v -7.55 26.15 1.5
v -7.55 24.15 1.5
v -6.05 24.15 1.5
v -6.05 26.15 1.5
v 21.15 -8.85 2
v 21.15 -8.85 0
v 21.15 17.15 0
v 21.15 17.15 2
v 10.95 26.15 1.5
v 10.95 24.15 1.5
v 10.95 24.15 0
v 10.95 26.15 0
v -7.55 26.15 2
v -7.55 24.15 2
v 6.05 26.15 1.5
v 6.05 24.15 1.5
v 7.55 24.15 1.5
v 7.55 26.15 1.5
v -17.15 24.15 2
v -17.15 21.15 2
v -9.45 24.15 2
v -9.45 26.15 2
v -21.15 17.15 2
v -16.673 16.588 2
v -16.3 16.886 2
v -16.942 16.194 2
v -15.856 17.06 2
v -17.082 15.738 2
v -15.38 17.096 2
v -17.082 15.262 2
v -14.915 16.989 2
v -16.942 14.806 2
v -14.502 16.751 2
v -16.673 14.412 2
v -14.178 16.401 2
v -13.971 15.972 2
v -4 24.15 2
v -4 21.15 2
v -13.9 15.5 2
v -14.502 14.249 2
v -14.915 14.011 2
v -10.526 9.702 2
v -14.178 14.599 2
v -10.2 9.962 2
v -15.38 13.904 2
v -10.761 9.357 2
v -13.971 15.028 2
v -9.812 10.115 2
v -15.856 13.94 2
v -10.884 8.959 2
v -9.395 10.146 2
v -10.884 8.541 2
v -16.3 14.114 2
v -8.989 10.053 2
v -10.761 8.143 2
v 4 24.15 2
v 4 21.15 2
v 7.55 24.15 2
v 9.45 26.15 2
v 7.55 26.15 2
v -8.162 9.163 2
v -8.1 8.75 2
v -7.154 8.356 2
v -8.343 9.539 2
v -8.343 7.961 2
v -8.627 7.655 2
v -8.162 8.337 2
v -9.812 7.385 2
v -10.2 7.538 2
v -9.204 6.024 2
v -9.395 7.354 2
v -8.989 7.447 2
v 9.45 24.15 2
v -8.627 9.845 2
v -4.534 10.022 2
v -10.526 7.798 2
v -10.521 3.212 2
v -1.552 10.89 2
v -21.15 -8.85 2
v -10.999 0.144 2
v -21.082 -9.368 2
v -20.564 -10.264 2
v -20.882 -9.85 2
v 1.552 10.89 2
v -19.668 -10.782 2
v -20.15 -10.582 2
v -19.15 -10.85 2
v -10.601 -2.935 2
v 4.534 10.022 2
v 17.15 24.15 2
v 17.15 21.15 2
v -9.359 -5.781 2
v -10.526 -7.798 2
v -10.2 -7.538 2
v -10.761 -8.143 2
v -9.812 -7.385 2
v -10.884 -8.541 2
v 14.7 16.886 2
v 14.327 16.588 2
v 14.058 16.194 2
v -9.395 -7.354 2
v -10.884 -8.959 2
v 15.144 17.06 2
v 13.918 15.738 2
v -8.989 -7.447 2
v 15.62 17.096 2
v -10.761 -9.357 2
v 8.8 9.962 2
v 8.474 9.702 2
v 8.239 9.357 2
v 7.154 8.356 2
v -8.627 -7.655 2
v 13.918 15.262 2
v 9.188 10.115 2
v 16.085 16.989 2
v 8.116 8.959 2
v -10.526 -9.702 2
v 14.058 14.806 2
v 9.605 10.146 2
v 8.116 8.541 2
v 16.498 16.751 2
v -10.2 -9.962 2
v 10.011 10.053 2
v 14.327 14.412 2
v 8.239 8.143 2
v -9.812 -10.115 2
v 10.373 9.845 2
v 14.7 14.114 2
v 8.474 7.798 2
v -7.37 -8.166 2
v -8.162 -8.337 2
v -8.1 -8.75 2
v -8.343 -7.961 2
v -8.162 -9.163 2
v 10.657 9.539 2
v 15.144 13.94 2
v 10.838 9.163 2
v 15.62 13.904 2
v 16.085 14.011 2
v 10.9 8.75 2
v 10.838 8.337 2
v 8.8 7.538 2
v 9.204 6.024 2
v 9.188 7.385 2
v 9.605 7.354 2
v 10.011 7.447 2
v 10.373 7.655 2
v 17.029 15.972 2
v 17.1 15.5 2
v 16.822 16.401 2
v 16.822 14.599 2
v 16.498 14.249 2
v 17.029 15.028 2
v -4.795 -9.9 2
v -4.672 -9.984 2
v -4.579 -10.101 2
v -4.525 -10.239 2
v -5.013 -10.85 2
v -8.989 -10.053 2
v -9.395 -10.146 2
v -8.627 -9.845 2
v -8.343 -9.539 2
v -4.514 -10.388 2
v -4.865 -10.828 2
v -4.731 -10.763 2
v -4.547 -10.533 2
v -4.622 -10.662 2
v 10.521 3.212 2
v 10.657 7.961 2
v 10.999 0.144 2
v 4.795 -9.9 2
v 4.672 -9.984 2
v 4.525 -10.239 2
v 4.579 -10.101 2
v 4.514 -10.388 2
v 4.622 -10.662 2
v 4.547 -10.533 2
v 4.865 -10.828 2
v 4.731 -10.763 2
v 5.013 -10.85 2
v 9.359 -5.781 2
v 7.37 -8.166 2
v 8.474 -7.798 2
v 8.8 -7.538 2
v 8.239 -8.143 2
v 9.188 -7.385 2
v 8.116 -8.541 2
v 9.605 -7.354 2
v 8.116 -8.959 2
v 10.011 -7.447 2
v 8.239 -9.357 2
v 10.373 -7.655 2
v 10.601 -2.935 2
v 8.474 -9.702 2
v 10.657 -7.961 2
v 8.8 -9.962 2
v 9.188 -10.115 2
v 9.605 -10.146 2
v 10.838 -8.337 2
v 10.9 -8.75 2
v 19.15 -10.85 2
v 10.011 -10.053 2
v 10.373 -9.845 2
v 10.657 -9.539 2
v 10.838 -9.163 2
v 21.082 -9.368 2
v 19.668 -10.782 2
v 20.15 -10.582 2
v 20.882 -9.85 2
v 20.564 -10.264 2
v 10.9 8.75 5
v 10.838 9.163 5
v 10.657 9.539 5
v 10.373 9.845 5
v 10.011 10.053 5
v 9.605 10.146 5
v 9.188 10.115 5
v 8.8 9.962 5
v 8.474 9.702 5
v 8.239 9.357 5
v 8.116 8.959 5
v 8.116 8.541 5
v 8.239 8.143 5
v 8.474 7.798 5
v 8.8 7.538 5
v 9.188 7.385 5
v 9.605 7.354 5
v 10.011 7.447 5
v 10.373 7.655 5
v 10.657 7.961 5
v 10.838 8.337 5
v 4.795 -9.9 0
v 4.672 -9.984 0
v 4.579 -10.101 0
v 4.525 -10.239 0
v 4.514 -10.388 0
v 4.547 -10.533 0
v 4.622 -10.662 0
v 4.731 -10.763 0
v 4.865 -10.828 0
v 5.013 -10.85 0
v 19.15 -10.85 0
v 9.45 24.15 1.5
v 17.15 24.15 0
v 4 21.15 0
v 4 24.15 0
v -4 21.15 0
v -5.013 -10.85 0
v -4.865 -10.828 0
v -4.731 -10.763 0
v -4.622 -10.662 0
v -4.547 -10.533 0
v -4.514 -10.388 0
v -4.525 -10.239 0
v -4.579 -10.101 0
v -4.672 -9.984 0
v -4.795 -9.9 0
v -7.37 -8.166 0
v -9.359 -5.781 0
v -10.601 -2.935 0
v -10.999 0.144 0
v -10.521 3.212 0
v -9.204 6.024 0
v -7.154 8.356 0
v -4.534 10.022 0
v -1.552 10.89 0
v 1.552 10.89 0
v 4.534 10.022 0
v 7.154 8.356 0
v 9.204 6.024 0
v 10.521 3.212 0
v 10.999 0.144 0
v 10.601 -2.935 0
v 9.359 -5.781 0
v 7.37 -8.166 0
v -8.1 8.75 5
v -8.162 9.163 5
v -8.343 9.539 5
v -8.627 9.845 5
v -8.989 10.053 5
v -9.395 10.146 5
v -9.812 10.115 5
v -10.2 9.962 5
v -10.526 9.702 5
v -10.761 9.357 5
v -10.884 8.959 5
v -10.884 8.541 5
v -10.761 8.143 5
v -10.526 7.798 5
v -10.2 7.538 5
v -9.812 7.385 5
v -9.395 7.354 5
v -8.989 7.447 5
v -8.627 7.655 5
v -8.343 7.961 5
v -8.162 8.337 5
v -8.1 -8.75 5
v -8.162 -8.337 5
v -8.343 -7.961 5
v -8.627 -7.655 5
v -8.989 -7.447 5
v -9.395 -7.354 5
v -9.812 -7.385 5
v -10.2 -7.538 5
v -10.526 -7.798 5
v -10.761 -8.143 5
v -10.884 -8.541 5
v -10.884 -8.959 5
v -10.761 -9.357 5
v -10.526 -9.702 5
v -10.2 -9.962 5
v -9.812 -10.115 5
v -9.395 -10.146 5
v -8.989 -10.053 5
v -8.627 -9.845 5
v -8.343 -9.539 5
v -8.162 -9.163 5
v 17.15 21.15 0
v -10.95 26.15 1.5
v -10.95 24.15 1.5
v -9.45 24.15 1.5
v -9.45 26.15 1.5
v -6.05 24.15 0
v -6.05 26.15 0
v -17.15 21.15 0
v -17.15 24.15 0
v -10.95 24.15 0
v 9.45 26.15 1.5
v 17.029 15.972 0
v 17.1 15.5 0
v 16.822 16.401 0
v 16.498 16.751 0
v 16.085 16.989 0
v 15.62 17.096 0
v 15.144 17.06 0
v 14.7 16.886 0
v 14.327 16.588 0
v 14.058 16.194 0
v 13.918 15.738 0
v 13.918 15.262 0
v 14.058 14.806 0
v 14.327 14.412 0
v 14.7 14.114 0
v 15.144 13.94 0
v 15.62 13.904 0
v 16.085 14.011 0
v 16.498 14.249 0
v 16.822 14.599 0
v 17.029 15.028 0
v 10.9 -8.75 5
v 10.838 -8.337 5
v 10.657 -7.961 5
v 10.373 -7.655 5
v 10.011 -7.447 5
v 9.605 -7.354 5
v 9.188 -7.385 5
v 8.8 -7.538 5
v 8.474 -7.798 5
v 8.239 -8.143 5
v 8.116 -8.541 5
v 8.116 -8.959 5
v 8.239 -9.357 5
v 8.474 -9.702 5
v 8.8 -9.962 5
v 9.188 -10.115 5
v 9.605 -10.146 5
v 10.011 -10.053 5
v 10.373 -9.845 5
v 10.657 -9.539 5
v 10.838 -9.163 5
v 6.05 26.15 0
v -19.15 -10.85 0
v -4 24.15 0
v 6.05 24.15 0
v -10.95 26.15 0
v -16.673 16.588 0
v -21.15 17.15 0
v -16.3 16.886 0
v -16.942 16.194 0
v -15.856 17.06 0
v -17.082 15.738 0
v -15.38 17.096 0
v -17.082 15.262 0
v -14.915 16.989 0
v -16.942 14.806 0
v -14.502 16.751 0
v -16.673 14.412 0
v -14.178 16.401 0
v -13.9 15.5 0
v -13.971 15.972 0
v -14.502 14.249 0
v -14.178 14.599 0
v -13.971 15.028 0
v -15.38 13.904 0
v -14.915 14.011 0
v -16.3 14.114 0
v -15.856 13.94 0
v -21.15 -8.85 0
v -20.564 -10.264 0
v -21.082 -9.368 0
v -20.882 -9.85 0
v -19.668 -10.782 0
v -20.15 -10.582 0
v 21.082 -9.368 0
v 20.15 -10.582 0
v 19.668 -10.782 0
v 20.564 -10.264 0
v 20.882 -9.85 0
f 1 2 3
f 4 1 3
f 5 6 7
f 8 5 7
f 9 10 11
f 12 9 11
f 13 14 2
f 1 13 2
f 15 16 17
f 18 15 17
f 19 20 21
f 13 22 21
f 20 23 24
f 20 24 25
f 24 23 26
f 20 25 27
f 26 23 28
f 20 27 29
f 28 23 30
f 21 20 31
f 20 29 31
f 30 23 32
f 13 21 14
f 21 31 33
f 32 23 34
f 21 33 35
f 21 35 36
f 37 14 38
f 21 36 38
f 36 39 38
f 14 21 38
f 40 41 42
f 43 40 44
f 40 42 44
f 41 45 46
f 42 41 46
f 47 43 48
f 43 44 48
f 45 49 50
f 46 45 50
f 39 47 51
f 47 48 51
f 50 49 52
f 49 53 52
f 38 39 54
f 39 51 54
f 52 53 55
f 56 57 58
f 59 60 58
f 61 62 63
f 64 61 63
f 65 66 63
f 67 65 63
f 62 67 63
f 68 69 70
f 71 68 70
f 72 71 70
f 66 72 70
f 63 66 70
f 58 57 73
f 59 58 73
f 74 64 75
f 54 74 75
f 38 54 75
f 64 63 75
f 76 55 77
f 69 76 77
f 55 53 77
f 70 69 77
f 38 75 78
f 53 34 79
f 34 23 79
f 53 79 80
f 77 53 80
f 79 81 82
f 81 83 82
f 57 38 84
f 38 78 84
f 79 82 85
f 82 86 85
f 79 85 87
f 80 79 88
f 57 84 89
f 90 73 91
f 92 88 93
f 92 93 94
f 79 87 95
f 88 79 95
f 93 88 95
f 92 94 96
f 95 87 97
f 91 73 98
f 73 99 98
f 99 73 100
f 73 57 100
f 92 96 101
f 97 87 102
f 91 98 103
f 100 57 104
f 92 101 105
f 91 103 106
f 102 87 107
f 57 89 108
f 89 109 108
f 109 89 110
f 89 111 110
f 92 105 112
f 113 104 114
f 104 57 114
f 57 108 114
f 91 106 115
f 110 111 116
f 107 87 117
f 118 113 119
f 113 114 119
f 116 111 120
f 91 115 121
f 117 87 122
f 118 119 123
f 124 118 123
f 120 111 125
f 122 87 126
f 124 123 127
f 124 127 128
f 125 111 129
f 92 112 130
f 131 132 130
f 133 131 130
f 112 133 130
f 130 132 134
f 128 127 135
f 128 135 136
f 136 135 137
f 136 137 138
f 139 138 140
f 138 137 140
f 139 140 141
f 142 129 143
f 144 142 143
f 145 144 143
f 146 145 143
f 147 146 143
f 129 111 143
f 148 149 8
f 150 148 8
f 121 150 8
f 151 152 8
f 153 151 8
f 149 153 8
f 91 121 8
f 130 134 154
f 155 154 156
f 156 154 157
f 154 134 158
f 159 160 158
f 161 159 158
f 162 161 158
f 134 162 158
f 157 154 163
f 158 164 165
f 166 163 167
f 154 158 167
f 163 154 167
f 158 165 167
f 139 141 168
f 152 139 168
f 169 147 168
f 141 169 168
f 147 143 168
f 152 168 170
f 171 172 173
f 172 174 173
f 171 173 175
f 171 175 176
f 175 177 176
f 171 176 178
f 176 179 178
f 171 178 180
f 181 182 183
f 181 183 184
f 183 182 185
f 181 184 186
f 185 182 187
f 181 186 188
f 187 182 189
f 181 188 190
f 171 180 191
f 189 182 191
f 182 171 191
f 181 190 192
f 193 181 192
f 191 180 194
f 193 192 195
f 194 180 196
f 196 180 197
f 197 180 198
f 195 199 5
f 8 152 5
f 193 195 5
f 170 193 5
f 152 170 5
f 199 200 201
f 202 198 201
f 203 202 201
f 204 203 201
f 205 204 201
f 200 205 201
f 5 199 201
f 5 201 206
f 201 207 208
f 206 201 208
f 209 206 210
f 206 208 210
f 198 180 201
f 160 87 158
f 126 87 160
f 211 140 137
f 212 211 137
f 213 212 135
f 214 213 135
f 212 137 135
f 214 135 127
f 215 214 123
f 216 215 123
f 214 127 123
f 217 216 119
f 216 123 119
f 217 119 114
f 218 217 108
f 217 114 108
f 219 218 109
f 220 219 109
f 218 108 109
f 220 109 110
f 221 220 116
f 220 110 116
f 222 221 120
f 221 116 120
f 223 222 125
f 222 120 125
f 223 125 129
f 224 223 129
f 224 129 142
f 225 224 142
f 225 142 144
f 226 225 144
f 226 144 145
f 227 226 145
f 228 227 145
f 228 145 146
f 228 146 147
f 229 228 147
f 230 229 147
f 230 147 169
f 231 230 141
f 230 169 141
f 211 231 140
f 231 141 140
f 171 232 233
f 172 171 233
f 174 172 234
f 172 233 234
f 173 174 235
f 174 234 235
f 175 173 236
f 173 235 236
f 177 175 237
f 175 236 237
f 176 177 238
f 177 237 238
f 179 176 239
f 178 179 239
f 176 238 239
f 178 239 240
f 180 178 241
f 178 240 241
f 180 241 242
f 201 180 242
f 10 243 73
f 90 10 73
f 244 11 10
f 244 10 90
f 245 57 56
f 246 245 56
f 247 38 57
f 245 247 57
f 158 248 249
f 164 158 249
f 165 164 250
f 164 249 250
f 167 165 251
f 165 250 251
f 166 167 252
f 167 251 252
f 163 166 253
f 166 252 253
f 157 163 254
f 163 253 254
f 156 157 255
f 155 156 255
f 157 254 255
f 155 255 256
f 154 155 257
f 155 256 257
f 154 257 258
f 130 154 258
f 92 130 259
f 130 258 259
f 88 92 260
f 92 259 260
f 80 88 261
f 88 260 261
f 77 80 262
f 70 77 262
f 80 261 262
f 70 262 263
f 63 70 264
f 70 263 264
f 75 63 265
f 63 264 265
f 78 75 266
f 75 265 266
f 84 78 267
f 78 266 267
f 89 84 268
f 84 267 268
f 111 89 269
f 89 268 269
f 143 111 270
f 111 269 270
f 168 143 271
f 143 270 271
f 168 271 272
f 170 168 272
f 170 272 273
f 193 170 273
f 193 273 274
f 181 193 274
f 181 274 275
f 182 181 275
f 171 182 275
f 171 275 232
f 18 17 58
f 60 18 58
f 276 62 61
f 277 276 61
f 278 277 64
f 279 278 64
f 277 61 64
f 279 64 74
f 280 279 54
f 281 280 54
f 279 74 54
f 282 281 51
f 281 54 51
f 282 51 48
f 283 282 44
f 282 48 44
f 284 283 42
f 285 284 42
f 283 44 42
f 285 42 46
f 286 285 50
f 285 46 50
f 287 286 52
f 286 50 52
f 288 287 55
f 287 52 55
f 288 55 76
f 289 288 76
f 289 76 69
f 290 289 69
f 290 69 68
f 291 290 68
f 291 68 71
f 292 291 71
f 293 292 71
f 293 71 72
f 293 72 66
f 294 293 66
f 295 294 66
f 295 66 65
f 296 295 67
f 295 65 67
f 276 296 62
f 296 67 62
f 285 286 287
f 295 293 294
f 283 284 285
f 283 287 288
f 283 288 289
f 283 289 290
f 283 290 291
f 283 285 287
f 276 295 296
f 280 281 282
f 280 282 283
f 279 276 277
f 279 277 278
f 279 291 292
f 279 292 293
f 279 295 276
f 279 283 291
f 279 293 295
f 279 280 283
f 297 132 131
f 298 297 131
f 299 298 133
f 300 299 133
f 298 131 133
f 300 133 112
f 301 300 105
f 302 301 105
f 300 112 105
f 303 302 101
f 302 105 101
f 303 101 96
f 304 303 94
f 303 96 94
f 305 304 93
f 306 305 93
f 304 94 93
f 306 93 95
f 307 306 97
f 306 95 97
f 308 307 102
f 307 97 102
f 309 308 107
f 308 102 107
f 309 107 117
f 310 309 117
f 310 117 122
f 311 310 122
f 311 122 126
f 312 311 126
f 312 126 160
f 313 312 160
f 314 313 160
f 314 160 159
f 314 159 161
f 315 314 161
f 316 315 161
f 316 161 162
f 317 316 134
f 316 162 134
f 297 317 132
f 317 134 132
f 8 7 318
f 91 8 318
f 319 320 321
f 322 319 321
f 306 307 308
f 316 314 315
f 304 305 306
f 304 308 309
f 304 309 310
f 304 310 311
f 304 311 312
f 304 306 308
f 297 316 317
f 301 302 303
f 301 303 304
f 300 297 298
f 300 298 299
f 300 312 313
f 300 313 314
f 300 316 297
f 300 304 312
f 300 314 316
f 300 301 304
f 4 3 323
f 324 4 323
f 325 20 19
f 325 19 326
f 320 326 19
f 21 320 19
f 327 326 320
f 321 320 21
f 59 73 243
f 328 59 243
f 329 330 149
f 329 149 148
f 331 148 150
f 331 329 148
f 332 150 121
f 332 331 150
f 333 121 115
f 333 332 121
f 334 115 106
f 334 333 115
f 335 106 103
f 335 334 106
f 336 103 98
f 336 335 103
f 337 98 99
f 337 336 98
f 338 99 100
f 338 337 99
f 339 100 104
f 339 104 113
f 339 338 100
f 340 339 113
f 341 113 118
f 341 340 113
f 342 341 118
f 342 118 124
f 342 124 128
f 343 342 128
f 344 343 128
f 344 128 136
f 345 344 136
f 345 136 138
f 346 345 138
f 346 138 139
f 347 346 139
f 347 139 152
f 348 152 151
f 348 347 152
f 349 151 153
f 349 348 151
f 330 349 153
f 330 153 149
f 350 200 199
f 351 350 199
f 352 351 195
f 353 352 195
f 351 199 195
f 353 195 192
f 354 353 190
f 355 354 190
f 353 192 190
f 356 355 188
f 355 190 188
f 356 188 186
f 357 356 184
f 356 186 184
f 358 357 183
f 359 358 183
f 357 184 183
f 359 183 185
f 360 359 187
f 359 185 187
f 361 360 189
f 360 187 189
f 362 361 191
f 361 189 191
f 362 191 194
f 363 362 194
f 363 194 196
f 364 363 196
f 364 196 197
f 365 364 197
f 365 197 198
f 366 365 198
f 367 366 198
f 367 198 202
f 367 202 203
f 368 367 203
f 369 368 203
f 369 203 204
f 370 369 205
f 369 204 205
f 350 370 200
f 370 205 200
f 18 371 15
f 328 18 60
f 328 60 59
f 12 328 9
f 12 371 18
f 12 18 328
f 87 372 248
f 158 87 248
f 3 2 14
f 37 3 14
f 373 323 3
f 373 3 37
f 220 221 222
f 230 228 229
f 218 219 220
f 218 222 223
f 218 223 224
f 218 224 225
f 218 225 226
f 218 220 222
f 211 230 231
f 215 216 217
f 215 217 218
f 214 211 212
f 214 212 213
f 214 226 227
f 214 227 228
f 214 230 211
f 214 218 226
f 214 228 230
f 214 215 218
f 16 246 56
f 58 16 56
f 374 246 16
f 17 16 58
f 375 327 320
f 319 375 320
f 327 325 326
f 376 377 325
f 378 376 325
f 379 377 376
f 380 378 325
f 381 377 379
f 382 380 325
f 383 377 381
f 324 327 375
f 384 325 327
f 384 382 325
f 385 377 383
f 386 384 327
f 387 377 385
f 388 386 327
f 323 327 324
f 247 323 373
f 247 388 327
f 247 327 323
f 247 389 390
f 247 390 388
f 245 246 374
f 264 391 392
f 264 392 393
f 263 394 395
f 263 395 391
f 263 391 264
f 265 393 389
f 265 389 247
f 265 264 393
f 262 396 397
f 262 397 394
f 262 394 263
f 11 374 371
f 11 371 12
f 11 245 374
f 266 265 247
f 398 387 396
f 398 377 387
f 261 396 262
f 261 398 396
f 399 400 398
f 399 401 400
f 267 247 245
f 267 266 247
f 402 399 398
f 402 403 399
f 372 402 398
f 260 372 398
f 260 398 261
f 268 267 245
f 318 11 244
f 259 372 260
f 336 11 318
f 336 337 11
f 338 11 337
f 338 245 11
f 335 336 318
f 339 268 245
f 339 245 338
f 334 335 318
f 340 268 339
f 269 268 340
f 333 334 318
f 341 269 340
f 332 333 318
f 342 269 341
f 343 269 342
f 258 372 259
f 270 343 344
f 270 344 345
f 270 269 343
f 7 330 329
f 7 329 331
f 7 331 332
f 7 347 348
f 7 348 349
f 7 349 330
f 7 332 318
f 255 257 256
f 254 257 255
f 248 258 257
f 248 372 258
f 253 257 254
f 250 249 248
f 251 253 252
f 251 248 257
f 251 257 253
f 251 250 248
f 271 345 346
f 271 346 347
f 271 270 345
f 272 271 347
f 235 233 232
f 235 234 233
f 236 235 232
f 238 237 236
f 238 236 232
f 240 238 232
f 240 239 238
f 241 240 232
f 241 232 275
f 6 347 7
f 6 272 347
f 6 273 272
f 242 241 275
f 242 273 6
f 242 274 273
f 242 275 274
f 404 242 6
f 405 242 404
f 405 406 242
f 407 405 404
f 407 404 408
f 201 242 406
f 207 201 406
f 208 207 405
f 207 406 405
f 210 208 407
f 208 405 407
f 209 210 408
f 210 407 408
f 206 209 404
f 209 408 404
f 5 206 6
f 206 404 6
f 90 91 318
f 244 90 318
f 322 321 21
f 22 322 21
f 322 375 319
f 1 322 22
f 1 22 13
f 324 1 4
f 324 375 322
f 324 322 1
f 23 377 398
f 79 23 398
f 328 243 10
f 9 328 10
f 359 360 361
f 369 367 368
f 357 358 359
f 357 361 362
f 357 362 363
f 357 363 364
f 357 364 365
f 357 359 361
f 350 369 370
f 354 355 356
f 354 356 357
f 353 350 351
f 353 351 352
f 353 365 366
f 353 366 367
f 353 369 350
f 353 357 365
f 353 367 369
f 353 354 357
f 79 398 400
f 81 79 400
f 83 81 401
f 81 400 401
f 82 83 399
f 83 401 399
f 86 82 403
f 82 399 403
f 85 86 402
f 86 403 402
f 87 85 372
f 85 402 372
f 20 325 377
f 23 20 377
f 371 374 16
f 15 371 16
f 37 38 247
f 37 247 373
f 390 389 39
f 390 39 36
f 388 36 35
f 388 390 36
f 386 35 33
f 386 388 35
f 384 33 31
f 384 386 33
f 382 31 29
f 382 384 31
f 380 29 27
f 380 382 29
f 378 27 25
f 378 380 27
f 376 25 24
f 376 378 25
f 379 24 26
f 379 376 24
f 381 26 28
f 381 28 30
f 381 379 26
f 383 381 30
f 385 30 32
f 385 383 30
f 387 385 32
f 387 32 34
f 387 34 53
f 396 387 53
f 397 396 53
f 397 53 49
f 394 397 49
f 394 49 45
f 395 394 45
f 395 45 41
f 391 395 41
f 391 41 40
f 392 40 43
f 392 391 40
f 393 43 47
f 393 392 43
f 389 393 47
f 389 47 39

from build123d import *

# Parameters (mm, degrees)
STOCK_DRIVEBLOCK_CNC_10MM_MASTER_1_OUTLI_R = 1.6
STOCK_DRIVEBLOCK_CNC_10MM_MASTER_1_DEPTH   = 2
STOCK_DRIVEBLOCK_CNC_10MM_MASTER_1_START   = 2
STOCK_DRIVEBLOCK_CNC_10MM_MASTER_1_2_OUT_R = 1.4
STOCK_DRIVEBLOCK_CNC_10MM_MASTER_1_2_DEPTH = 3
SKETCH1_W                                  = 34.3
SKETCH1_H                                  = 2
BOSS_EXTRUDE1_DEPTH                        = 3
BOSS_EXTRUDE2_DEPTH                        = 2
SKETCH3_W                                  = 8
SKETCH3_H                                  = 3
CUT_EXTRUDE1_DEPTH                         = 10


# Read off the part's stored shape, not the designer's step: Stock-driveblock-cnc-10mm-master-1
with BuildPart() as part:
    # Stock-driveblock-cnc-10mm-master-1 outli → Stock-driveblock-cnc-10mm-master-1 (new body)
    with BuildSketch(Plane.XY):
        with BuildLine():
            Line((21.15, -8.85), (21.15, 17.15))
            Line((21.15, 17.15), (17.15, 21.15))
            Line((17.15, 21.15), (-17.15, 21.15))
            Line((-17.15, 21.15), (-21.15, 17.15))
            Line((-21.15, 17.15), (-21.15, -8.85))
            ThreePointArc((-21.15, -8.85), (-20.564213562, -10.264213562), (-19.15, -10.85))
            Line((-19.15, -10.85), (-5.012733785, -10.85))
            ThreePointArc((-5.012733785, -10.85), (-4.525394068, -10.461803399), (-4.794788838, -9.9))
            ThreePointArc((-4.794788838, -9.9), (0, 11), (4.794788838, -9.9))
            ThreePointArc((4.794788838, -9.9), (4.525394068, -10.461803399), (5.012733785, -10.85))
            Line((5.012733785, -10.85), (19.15, -10.85))
            ThreePointArc((19.15, -10.85), (20.564213562, -10.264213562), (21.15, -8.85))
        make_face()
        with Locations((-15.5, 15.5)):
            Circle(STOCK_DRIVEBLOCK_CNC_10MM_MASTER_1_OUTLI_R, mode=Mode.SUBTRACT)
        with Locations((15.5, 15.5)):
            Circle(STOCK_DRIVEBLOCK_CNC_10MM_MASTER_1_OUTLI_R, mode=Mode.SUBTRACT)
    extrude(amount=STOCK_DRIVEBLOCK_CNC_10MM_MASTER_1_DEPTH)

    # Stock-driveblock-cnc-10mm-master-1 2 out → Stock-driveblock-cnc-10mm-master-1 2 (add)
    with BuildSketch(Plane.XY.offset(STOCK_DRIVEBLOCK_CNC_10MM_MASTER_1_START)):
        with Locations((-9.5, 8.75)):
            Circle(STOCK_DRIVEBLOCK_CNC_10MM_MASTER_1_2_OUT_R)
        with Locations((9.5, 8.75)):
            Circle(STOCK_DRIVEBLOCK_CNC_10MM_MASTER_1_2_OUT_R)
        with Locations((9.5, -8.75)):
            Circle(STOCK_DRIVEBLOCK_CNC_10MM_MASTER_1_2_OUT_R)
        with Locations((-9.5, -8.75)):
            Circle(STOCK_DRIVEBLOCK_CNC_10MM_MASTER_1_2_OUT_R)
    extrude(amount=STOCK_DRIVEBLOCK_CNC_10MM_MASTER_1_2_DEPTH)

    # Sketch1 → Boss-Extrude1 (add)
    with BuildSketch(Plane(origin=(0, 21.15, 0), x_dir=(1, 0, 0), z_dir=(0, 1, 0))):
        with Locations((0, -1)):
            Rectangle(SKETCH1_W, SKETCH1_H)
    extrude(amount=BOSS_EXTRUDE1_DEPTH)

    # Sketch2 → Boss-Extrude2 (add)
    with BuildSketch(Plane(origin=(0, 24.15, 0), x_dir=(1, 0, 0), z_dir=(0, 1, 0))):
        Polygon((9.45, -1.5), (10.95, -1.5), (10.95, 0), (6.05, 0), (6.05, -1.5), (7.55, -1.5), (7.55, -2), (9.45, -2), align=None)
        Polygon((-9.45, -1.5), (-9.45, -2), (-7.55, -2), (-7.55, -1.5), (-6.05, -1.5), (-6.05, 0), (-10.95, 0), (-10.95, -1.5), align=None)
    extrude(amount=BOSS_EXTRUDE2_DEPTH)

    # Sketch3 → Cut-Extrude1 (cut)
    with BuildSketch(Plane.XY.offset(2)):
        with Locations((0, 22.65)):
            Rectangle(SKETCH3_W, SKETCH3_H)
    extrude(amount=-CUT_EXTRUDE1_DEPTH, mode=Mode.SUBTRACT)


solid = part.part
